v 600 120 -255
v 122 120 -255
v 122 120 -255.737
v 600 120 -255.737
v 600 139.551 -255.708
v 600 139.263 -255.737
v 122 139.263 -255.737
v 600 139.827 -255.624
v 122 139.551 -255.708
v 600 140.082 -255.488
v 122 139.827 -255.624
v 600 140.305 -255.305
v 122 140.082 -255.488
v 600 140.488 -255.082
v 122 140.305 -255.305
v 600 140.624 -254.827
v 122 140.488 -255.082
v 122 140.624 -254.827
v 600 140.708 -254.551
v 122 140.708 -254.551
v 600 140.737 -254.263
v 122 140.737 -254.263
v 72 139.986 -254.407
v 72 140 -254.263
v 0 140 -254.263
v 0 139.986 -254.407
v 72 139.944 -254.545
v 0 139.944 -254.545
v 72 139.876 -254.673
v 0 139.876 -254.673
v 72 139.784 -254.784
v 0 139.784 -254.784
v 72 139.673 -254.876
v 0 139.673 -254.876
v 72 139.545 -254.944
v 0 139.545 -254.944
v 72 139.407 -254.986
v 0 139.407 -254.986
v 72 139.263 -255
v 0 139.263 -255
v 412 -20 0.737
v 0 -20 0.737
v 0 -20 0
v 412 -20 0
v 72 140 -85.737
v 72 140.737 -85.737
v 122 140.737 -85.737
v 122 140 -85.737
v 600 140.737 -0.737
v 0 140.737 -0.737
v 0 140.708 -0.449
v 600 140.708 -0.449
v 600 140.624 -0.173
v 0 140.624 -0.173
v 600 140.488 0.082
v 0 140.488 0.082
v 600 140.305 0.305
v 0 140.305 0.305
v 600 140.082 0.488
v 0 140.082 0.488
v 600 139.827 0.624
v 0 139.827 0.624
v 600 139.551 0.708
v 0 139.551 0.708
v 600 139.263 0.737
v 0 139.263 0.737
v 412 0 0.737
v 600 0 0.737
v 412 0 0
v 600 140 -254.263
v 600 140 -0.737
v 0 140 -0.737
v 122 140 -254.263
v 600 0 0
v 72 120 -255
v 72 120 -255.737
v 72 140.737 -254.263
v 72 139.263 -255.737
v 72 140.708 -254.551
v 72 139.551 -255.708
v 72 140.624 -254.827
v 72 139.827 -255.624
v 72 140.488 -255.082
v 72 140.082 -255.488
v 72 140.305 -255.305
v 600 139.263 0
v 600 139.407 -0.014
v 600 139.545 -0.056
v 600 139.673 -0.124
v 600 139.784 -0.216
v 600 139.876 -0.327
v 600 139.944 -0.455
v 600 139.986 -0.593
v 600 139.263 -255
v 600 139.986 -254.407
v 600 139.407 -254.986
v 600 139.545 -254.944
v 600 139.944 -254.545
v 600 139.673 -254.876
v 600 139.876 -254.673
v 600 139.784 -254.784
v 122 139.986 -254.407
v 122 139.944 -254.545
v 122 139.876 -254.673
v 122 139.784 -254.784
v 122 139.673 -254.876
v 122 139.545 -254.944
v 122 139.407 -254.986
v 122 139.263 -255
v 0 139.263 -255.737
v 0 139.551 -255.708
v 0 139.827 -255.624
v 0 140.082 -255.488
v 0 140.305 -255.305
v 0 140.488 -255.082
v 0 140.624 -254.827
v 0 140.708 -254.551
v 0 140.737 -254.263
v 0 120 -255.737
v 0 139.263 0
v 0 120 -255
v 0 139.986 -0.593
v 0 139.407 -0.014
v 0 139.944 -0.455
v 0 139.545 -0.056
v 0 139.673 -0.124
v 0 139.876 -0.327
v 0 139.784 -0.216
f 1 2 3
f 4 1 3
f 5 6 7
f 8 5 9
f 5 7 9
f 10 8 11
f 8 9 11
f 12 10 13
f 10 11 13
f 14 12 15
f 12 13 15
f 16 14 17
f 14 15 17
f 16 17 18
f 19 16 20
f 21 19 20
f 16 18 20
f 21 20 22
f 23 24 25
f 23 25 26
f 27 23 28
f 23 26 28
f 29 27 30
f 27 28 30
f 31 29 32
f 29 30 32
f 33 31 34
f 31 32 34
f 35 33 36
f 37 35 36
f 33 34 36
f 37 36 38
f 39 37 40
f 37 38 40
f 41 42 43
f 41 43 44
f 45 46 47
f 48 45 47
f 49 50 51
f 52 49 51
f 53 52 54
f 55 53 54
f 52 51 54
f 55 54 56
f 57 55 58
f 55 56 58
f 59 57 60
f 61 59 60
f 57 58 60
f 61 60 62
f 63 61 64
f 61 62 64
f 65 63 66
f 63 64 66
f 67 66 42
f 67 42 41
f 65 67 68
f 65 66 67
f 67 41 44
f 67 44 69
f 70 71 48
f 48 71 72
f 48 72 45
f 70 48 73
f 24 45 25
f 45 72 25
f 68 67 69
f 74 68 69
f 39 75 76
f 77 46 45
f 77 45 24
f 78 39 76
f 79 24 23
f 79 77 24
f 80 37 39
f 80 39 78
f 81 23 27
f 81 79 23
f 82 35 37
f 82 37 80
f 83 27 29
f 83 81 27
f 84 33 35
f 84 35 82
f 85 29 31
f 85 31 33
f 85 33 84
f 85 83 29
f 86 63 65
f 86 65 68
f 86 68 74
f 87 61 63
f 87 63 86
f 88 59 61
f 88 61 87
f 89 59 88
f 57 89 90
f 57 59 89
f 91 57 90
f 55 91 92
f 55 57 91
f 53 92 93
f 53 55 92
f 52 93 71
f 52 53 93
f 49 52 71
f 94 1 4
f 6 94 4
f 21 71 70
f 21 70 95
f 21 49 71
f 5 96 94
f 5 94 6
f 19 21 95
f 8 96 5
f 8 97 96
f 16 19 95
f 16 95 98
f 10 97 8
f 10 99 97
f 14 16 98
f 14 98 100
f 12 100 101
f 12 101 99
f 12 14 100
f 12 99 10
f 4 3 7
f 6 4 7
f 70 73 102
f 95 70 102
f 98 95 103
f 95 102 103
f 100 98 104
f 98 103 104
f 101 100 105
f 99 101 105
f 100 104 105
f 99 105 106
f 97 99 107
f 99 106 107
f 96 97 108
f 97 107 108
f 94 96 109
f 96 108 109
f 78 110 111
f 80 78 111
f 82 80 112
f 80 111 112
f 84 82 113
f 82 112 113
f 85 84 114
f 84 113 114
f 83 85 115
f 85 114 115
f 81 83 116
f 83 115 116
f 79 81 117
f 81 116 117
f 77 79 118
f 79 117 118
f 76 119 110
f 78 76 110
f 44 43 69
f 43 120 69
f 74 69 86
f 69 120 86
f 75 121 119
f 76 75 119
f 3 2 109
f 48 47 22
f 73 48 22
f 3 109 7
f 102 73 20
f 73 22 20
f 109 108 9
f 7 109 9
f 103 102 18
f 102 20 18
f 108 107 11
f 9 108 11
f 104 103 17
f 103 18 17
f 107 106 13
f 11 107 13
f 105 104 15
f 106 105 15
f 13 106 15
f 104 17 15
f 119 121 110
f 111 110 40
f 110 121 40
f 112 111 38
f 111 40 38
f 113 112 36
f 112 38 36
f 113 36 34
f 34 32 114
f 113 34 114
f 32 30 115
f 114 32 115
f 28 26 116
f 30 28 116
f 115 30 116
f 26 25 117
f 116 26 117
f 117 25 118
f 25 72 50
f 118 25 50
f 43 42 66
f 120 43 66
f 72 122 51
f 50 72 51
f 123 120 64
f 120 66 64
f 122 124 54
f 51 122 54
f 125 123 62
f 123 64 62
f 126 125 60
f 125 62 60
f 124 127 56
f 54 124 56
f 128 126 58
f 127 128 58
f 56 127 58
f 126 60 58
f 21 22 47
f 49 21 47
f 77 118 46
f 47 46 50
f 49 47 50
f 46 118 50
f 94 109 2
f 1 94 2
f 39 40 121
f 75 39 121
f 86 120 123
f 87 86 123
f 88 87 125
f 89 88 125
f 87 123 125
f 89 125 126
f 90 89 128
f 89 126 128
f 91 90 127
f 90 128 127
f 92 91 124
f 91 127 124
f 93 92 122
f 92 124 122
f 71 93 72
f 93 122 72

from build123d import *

# Parameters (mm, degrees)
BASE_FLANGE1_DEPTH  = 600
SKETCH7_W           = 412
SKETCH7_H           = 20
BOSS_EXTRUDE1_DEPTH = 0.7366
SKETCH8_W           = 50
SKETCH8_H           = 170
CUT_EXTRUDE2_DEPTH  = 672.742110604


# Sheet-metal steps are written as plain solids
with BuildPart() as part:
    # Sketch1 → Base-Flange1 (new body)
    with BuildSketch(Plane(origin=(0, 0, 0), x_dir=(0, 0, -1), z_dir=(1, 0, 0))):
        with BuildLine():
            Line((0, 0), (0, 139.2634))
            ThreePointArc((0, 139.2634), (0.215745145, 139.784254855), (0.7366, 140))
            Line((0.7366, 140), (254.2634, 140))
            ThreePointArc((254.2634, 140), (254.784254855, 139.784254855), (255, 139.2634))
            Line((255, 139.2634), (255, 120))
            Line((255, 120), (255.7366, 120))
            Line((255.7366, 120), (255.7366, 139.2634))
            ThreePointArc((255.7366, 139.2634), (255.30510971, 140.30510971), (254.2634, 140.7366))
            Line((254.2634, 140.7366), (0.7366, 140.7366))
            ThreePointArc((0.7366, 140.7366), (-0.30510971, 140.30510971), (-0.7366, 139.2634))
            Line((-0.7366, 139.2634), (-0.7366, 0))
            Line((-0.7366, 0), (0, 0))
        make_face()
    extrude(amount=BASE_FLANGE1_DEPTH)

    # Sketch7 → Boss-Extrude1 (add)
    with BuildSketch(Plane.XY.offset(0.7366)):
        with Locations((206, -10)):
            Rectangle(SKETCH7_W, SKETCH7_H)
    extrude(amount=-BOSS_EXTRUDE1_DEPTH)

    # Sketch8 → Cut-Extrude2 (cut, through all)
    with BuildSketch(Plane(origin=(0, 140.7366, 0), x_dir=(1, 0, 0), z_dir=(0, 1, 0))):
        with Locations((97, 170.7366)):
            Rectangle(SKETCH8_W, SKETCH8_H)
    extrude(amount=-CUT_EXTRUDE2_DEPTH, mode=Mode.SUBTRACT)


solid = part.part
